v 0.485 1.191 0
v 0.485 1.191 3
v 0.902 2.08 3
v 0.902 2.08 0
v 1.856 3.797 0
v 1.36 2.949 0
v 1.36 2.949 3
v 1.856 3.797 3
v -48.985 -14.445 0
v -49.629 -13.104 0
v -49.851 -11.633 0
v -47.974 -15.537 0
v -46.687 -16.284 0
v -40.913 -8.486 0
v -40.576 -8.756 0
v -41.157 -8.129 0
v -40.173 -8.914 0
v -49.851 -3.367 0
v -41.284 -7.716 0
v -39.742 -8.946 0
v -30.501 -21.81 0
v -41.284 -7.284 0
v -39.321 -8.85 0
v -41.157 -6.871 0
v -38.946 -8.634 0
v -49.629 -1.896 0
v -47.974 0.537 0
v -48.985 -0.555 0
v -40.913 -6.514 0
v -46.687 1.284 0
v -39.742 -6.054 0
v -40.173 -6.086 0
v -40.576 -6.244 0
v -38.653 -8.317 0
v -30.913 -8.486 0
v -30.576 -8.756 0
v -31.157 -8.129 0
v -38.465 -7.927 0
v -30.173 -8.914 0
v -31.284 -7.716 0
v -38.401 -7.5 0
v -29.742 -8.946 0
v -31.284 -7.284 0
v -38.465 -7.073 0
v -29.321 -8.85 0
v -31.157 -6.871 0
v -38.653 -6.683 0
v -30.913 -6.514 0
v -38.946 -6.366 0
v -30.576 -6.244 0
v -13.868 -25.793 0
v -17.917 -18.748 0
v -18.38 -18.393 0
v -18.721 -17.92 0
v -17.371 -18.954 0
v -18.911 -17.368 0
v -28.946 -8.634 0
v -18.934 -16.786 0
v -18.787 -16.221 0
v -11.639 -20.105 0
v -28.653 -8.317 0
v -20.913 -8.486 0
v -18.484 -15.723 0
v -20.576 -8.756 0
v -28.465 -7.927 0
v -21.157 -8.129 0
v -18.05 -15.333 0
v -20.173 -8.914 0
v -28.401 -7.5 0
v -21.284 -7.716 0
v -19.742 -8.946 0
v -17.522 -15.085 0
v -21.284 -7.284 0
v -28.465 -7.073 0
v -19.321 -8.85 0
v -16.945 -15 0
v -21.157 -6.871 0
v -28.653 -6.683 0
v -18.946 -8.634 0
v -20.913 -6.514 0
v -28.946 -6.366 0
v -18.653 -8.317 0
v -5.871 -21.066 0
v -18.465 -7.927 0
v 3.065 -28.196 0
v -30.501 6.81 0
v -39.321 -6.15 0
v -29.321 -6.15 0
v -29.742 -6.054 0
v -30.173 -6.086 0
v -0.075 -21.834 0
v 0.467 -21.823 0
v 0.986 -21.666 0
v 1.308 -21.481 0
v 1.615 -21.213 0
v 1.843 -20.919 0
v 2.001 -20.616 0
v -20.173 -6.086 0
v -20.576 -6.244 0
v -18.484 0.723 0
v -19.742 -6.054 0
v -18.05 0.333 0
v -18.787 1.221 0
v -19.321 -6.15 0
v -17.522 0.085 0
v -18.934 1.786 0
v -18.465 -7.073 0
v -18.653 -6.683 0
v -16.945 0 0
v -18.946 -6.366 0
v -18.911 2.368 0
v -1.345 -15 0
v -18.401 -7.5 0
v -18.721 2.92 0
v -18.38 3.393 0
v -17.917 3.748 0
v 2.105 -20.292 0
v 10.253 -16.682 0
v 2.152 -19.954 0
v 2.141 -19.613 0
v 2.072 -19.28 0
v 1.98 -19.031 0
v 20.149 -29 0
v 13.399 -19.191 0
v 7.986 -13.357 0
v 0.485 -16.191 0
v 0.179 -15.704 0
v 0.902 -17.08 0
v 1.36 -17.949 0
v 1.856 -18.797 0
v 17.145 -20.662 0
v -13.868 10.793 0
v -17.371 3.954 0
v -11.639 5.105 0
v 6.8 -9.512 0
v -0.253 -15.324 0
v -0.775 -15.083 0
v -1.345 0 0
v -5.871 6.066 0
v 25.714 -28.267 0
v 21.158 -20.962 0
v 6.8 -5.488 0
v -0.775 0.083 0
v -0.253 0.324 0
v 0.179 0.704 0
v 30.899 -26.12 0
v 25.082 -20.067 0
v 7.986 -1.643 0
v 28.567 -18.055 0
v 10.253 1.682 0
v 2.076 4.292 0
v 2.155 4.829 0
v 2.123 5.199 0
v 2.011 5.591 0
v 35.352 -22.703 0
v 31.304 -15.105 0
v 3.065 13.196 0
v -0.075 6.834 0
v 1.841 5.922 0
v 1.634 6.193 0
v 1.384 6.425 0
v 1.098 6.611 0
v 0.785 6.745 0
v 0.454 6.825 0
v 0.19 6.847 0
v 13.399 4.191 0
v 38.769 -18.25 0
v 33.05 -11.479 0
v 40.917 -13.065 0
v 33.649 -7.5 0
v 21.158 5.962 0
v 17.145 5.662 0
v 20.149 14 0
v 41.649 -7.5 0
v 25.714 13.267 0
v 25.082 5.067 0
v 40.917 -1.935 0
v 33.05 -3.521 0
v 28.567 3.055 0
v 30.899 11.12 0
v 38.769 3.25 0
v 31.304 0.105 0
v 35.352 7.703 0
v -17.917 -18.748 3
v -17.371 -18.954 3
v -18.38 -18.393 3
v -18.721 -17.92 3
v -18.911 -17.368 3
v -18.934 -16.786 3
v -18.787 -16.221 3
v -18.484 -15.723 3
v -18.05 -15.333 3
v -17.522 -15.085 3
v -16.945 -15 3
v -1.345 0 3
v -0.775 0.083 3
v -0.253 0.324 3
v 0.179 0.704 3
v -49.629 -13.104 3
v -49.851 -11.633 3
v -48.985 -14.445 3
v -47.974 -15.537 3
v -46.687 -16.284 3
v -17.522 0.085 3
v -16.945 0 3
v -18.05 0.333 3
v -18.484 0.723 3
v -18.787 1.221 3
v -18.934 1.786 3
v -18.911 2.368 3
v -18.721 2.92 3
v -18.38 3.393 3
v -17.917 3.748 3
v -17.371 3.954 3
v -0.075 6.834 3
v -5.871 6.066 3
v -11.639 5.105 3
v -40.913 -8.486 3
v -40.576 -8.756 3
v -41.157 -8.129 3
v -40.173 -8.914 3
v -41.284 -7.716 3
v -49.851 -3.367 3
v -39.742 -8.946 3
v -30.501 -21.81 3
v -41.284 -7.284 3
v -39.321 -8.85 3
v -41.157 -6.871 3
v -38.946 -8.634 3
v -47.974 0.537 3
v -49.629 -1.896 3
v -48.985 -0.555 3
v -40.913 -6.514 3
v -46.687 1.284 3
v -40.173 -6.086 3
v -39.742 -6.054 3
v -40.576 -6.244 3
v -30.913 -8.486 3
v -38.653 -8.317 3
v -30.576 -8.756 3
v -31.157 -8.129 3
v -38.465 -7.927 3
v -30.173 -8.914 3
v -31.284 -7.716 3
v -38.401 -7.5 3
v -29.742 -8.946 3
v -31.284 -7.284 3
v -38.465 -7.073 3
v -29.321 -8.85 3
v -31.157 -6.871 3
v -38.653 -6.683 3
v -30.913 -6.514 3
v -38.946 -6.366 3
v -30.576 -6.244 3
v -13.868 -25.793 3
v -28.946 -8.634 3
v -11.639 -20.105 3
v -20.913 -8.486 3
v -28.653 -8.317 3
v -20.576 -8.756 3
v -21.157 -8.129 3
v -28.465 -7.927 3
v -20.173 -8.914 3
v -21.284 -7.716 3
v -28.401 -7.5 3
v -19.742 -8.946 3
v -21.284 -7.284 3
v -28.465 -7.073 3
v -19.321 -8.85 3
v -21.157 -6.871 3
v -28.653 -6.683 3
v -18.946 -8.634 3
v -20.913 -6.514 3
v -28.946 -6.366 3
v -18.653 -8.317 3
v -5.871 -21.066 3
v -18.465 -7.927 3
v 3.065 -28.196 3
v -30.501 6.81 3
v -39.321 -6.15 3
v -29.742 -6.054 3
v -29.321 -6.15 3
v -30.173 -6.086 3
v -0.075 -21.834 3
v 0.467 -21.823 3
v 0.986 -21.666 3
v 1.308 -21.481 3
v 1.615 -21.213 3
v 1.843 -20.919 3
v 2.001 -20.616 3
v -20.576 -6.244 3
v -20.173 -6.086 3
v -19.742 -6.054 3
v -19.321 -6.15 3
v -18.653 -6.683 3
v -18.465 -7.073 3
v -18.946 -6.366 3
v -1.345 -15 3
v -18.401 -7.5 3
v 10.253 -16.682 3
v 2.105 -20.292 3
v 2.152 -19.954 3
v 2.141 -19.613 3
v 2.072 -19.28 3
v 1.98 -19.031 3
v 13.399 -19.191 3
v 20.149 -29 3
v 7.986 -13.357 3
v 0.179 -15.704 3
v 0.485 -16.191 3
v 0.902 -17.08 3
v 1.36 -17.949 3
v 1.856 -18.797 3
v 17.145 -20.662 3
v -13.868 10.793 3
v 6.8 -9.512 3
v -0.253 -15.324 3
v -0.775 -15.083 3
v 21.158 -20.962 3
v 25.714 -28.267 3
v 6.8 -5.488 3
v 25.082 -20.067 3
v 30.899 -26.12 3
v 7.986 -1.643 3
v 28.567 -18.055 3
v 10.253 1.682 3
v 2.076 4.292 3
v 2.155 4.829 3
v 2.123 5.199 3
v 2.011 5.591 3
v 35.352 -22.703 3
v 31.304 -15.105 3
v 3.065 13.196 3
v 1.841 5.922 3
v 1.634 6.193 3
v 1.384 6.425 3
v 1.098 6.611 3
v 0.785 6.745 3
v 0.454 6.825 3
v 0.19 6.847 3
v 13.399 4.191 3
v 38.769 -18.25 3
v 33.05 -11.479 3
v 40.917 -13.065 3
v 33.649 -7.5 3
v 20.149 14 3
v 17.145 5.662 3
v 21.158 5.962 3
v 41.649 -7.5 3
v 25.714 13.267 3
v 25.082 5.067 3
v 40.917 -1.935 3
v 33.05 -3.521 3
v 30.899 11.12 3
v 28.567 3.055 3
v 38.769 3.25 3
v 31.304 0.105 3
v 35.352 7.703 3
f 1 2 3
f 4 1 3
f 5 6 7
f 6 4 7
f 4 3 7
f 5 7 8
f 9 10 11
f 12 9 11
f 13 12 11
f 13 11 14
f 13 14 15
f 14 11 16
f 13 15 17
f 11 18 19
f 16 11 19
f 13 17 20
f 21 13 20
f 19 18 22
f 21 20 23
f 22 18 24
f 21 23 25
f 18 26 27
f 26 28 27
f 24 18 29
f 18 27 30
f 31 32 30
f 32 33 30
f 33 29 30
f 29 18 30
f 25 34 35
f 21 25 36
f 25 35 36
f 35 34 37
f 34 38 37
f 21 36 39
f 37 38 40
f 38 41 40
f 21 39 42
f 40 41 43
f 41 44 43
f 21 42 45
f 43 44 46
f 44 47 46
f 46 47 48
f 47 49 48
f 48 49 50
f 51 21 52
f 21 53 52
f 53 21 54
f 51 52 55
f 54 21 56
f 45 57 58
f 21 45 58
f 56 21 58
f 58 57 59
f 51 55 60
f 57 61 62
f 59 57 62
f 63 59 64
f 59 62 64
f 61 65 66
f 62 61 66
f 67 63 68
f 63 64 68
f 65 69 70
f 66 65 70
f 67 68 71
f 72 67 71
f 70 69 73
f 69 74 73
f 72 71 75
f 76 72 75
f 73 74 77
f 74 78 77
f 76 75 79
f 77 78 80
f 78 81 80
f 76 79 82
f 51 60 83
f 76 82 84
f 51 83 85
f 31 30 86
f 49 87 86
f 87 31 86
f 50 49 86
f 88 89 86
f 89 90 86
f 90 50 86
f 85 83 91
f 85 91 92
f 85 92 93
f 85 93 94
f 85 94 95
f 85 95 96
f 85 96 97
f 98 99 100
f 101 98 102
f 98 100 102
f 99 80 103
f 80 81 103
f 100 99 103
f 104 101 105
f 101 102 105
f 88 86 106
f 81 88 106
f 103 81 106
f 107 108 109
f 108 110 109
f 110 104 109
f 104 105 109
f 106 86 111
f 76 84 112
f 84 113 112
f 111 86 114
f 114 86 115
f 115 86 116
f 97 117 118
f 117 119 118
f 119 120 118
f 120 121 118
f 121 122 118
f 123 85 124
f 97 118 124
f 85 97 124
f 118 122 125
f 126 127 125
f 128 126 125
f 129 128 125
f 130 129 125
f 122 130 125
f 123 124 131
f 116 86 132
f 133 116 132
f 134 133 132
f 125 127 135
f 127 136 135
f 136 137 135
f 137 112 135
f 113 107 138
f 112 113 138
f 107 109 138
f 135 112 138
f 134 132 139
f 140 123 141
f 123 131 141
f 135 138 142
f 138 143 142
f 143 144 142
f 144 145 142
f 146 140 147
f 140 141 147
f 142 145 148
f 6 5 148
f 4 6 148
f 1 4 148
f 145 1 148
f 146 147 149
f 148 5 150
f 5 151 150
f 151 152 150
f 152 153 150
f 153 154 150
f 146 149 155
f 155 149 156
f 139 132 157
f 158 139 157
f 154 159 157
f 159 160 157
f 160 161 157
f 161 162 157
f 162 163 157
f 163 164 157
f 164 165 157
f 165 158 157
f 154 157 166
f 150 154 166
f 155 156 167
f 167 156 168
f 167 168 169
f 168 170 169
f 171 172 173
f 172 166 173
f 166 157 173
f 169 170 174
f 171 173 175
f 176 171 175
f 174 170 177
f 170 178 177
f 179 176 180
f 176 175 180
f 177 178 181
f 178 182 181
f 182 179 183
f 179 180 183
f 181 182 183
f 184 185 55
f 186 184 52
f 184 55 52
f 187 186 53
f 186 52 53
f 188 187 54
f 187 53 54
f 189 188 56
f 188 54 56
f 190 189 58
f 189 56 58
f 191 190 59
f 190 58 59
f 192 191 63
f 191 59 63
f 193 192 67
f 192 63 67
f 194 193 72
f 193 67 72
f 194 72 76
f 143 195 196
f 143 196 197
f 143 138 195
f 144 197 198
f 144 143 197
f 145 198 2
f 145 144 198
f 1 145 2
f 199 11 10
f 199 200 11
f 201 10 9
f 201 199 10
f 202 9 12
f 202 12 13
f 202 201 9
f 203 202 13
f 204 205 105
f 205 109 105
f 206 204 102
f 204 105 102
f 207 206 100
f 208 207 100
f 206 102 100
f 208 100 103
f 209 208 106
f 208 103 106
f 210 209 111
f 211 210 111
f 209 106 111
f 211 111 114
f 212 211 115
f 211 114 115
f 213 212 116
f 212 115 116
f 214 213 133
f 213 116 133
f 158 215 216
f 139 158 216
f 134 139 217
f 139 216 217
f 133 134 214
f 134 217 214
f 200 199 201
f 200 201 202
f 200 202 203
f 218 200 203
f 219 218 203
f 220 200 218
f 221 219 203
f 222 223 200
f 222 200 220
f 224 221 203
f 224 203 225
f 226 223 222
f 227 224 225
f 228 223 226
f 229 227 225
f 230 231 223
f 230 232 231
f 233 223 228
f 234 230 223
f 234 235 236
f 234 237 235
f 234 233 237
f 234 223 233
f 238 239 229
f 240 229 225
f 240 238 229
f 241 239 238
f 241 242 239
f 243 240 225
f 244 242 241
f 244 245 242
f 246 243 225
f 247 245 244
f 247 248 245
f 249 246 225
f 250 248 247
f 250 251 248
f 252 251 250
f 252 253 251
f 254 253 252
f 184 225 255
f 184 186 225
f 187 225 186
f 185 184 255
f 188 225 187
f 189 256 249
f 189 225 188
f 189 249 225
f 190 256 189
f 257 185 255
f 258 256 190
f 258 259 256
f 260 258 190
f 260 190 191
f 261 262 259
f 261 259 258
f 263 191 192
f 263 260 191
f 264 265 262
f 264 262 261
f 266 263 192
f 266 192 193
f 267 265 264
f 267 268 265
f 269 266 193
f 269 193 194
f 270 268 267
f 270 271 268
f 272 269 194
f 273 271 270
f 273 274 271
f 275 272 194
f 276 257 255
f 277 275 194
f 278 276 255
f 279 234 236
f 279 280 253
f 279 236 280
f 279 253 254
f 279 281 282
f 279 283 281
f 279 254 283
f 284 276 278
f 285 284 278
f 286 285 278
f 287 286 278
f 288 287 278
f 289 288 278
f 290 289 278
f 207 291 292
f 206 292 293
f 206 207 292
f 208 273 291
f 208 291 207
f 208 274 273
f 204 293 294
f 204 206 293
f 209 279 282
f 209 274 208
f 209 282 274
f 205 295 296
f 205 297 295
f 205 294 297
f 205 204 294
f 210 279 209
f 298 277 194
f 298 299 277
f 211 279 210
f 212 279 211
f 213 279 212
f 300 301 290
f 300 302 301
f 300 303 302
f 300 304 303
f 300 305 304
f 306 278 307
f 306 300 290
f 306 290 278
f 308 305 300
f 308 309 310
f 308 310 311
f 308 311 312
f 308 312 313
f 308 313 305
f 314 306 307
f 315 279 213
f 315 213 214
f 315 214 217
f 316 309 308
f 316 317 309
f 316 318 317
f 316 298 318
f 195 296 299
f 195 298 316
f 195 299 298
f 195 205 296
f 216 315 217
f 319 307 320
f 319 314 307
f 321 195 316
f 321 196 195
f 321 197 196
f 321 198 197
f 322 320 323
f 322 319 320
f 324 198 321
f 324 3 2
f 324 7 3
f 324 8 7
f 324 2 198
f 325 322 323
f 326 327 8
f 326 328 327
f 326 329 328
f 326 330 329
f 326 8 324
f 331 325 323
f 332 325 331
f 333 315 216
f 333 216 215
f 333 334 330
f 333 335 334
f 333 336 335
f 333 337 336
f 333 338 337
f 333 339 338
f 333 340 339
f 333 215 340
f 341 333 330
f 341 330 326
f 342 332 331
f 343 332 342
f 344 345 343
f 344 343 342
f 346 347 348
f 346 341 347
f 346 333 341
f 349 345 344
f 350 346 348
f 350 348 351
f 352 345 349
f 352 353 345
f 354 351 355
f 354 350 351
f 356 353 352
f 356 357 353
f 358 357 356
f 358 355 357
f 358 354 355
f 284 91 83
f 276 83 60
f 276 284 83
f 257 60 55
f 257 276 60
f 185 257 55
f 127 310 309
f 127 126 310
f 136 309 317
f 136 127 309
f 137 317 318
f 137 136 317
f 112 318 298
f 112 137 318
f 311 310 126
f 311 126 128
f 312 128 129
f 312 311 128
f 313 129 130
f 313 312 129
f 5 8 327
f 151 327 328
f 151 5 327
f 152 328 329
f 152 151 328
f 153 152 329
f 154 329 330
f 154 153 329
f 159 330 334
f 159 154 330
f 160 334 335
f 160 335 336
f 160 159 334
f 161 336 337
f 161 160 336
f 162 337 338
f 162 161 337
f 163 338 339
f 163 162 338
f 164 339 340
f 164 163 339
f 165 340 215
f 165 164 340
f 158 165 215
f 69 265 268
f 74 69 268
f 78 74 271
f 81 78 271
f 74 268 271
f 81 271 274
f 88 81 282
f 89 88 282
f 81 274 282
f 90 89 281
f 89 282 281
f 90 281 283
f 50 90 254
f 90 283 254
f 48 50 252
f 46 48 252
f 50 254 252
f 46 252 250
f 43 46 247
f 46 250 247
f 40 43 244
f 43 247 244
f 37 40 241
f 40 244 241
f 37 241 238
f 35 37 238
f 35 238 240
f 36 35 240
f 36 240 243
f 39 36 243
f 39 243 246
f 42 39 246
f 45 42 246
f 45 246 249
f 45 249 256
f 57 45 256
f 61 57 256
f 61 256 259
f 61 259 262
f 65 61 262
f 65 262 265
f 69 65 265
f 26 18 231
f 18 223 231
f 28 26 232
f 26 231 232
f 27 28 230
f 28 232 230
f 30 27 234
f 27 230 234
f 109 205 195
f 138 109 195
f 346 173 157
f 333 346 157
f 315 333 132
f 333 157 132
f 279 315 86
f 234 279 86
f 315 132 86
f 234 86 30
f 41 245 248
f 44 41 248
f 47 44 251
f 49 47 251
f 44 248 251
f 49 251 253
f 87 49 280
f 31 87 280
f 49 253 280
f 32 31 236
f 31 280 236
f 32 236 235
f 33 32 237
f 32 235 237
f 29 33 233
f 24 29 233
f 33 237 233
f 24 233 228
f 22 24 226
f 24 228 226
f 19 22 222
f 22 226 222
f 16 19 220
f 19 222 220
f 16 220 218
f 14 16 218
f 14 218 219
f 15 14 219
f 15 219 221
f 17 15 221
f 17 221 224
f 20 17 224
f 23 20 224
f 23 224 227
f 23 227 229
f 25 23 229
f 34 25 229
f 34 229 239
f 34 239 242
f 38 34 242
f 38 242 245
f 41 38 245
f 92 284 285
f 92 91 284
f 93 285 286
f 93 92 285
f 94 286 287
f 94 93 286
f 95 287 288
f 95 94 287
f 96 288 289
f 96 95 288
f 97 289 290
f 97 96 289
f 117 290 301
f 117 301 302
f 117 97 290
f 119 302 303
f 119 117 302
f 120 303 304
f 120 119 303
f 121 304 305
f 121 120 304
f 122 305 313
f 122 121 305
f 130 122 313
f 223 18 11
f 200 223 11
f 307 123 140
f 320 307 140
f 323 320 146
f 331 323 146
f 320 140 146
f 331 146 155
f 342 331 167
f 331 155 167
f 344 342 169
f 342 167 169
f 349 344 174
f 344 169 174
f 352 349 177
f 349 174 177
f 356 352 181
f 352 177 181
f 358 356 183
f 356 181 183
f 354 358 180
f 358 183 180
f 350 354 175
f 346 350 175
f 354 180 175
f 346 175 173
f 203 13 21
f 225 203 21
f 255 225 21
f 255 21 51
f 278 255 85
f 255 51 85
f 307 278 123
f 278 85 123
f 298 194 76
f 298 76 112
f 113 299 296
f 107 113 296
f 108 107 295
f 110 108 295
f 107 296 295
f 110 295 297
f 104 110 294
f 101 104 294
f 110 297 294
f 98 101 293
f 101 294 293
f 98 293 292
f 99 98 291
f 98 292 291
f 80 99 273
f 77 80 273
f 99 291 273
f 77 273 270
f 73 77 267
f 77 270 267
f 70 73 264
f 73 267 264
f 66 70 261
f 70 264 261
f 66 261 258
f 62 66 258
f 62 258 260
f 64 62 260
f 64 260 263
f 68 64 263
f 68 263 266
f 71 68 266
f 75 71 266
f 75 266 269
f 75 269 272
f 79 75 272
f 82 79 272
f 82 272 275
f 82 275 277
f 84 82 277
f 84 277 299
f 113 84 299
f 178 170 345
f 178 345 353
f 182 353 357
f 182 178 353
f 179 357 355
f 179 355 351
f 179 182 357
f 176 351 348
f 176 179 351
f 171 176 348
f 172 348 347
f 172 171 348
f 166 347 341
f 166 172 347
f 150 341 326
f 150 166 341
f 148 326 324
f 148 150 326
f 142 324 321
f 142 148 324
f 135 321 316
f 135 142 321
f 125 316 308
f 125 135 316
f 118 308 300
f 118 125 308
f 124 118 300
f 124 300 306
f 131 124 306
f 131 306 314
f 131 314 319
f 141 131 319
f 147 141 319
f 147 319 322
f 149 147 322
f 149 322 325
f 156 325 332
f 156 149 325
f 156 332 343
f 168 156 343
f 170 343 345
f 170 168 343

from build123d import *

# Parameters (mm, degrees)
SKETCH_1_R          = 13.5
EXTRUDE_1_DEPTH     = 3
SKETCH_2_R          = 1.45
CUT_EXTRUDE_1_DEPTH = 58.750135626
FILLET_1_R          = 5
CUT_EXTRUDE_2_DEPTH = 58.750135626
FILLET_2_R          = 2


with BuildPart() as part:
    # 草图1 → 凸台-拉伸1 (new body)
    with BuildSketch(Plane.XY):
        with BuildLine():
            Line((-49.85055832, 0), (-49.85055832, -15))
            ThreePointArc((-49.85055832, -15), (-15.543694916, -25.465682976), (20.14944168, -29))
            ThreePointArc((20.14944168, -29), (41.64944168, -7.5), (20.14944168, 14))
            ThreePointArc((20.14944168, 14), (-15.543694916, 10.465682976), (-49.85055832, 0))
        make_face()
        with Locations((20.14944168, -7.5)):
            Circle(SKETCH_1_R, mode=Mode.SUBTRACT)
    extrude(amount=EXTRUDE_1_DEPTH)

    # 草图2 → 切除-拉伸1 (cut, through all)
    with BuildSketch(Plane.XY.offset(3)):
        with Locations((-39.85055832, -7.5)):
            Circle(SKETCH_2_R)
        with Locations((-29.85055832, -7.5)):
            Circle(SKETCH_2_R)
        with Locations((-19.85055832, -7.5)):
            Circle(SKETCH_2_R)
    extrude(amount=-CUT_EXTRUDE_1_DEPTH, mode=Mode.SUBTRACT)

    # 圆角1
    fillet_1_edges = [part.edges().sort_by_distance(p)[0] for p in [
        (-49.85055832, -15, 1.5),
        (-49.85055832, 0, 1.5),
    ]]
    fillet(fillet_1_edges, radius=FILLET_1_R)

    # 草图3 → 切除-拉伸2 (cut, through all)
    with BuildSketch(Plane.XY.offset(3)):
        with BuildLine():
            Line((-32.310066515, 0), (0, 0))
            ThreePointArc((0, 0), (1.911289465, 3.885069336), (4.562236757, 7.308411215))
            ThreePointArc((4.562236757, 7.308411215), (-14.069588262, 4.641414469), (-32.310066515, 0))
        make_face()
        with BuildLine():
            Line((-32.310066515, -15), (0, -15))
            ThreePointArc((0, -15), (1.911289465, -18.885069336), (4.562236757, -22.308411215))
            ThreePointArc((4.562236757, -22.308411215), (-14.069588262, -19.641414469), (-32.310066515, -15))
        make_face()
    extrude(amount=-CUT_EXTRUDE_2_DEPTH, mode=Mode.SUBTRACT)

    # 圆角2
    fillet_2_edges = [part.edges().sort_by_distance(p)[0] for p in [
        (0, -15, 1.5),
        (4.562236757, -22.308411215, 1.5),
        (-32.310066515, -15, 1.5),
        (4.562236757, 7.308411215, 1.5),
        (0, 0, 1.5),
        (-32.310066515, 0, 1.5),
    ]]
    fillet(fillet_2_edges, radius=FILLET_2_R)


solid = part.part
